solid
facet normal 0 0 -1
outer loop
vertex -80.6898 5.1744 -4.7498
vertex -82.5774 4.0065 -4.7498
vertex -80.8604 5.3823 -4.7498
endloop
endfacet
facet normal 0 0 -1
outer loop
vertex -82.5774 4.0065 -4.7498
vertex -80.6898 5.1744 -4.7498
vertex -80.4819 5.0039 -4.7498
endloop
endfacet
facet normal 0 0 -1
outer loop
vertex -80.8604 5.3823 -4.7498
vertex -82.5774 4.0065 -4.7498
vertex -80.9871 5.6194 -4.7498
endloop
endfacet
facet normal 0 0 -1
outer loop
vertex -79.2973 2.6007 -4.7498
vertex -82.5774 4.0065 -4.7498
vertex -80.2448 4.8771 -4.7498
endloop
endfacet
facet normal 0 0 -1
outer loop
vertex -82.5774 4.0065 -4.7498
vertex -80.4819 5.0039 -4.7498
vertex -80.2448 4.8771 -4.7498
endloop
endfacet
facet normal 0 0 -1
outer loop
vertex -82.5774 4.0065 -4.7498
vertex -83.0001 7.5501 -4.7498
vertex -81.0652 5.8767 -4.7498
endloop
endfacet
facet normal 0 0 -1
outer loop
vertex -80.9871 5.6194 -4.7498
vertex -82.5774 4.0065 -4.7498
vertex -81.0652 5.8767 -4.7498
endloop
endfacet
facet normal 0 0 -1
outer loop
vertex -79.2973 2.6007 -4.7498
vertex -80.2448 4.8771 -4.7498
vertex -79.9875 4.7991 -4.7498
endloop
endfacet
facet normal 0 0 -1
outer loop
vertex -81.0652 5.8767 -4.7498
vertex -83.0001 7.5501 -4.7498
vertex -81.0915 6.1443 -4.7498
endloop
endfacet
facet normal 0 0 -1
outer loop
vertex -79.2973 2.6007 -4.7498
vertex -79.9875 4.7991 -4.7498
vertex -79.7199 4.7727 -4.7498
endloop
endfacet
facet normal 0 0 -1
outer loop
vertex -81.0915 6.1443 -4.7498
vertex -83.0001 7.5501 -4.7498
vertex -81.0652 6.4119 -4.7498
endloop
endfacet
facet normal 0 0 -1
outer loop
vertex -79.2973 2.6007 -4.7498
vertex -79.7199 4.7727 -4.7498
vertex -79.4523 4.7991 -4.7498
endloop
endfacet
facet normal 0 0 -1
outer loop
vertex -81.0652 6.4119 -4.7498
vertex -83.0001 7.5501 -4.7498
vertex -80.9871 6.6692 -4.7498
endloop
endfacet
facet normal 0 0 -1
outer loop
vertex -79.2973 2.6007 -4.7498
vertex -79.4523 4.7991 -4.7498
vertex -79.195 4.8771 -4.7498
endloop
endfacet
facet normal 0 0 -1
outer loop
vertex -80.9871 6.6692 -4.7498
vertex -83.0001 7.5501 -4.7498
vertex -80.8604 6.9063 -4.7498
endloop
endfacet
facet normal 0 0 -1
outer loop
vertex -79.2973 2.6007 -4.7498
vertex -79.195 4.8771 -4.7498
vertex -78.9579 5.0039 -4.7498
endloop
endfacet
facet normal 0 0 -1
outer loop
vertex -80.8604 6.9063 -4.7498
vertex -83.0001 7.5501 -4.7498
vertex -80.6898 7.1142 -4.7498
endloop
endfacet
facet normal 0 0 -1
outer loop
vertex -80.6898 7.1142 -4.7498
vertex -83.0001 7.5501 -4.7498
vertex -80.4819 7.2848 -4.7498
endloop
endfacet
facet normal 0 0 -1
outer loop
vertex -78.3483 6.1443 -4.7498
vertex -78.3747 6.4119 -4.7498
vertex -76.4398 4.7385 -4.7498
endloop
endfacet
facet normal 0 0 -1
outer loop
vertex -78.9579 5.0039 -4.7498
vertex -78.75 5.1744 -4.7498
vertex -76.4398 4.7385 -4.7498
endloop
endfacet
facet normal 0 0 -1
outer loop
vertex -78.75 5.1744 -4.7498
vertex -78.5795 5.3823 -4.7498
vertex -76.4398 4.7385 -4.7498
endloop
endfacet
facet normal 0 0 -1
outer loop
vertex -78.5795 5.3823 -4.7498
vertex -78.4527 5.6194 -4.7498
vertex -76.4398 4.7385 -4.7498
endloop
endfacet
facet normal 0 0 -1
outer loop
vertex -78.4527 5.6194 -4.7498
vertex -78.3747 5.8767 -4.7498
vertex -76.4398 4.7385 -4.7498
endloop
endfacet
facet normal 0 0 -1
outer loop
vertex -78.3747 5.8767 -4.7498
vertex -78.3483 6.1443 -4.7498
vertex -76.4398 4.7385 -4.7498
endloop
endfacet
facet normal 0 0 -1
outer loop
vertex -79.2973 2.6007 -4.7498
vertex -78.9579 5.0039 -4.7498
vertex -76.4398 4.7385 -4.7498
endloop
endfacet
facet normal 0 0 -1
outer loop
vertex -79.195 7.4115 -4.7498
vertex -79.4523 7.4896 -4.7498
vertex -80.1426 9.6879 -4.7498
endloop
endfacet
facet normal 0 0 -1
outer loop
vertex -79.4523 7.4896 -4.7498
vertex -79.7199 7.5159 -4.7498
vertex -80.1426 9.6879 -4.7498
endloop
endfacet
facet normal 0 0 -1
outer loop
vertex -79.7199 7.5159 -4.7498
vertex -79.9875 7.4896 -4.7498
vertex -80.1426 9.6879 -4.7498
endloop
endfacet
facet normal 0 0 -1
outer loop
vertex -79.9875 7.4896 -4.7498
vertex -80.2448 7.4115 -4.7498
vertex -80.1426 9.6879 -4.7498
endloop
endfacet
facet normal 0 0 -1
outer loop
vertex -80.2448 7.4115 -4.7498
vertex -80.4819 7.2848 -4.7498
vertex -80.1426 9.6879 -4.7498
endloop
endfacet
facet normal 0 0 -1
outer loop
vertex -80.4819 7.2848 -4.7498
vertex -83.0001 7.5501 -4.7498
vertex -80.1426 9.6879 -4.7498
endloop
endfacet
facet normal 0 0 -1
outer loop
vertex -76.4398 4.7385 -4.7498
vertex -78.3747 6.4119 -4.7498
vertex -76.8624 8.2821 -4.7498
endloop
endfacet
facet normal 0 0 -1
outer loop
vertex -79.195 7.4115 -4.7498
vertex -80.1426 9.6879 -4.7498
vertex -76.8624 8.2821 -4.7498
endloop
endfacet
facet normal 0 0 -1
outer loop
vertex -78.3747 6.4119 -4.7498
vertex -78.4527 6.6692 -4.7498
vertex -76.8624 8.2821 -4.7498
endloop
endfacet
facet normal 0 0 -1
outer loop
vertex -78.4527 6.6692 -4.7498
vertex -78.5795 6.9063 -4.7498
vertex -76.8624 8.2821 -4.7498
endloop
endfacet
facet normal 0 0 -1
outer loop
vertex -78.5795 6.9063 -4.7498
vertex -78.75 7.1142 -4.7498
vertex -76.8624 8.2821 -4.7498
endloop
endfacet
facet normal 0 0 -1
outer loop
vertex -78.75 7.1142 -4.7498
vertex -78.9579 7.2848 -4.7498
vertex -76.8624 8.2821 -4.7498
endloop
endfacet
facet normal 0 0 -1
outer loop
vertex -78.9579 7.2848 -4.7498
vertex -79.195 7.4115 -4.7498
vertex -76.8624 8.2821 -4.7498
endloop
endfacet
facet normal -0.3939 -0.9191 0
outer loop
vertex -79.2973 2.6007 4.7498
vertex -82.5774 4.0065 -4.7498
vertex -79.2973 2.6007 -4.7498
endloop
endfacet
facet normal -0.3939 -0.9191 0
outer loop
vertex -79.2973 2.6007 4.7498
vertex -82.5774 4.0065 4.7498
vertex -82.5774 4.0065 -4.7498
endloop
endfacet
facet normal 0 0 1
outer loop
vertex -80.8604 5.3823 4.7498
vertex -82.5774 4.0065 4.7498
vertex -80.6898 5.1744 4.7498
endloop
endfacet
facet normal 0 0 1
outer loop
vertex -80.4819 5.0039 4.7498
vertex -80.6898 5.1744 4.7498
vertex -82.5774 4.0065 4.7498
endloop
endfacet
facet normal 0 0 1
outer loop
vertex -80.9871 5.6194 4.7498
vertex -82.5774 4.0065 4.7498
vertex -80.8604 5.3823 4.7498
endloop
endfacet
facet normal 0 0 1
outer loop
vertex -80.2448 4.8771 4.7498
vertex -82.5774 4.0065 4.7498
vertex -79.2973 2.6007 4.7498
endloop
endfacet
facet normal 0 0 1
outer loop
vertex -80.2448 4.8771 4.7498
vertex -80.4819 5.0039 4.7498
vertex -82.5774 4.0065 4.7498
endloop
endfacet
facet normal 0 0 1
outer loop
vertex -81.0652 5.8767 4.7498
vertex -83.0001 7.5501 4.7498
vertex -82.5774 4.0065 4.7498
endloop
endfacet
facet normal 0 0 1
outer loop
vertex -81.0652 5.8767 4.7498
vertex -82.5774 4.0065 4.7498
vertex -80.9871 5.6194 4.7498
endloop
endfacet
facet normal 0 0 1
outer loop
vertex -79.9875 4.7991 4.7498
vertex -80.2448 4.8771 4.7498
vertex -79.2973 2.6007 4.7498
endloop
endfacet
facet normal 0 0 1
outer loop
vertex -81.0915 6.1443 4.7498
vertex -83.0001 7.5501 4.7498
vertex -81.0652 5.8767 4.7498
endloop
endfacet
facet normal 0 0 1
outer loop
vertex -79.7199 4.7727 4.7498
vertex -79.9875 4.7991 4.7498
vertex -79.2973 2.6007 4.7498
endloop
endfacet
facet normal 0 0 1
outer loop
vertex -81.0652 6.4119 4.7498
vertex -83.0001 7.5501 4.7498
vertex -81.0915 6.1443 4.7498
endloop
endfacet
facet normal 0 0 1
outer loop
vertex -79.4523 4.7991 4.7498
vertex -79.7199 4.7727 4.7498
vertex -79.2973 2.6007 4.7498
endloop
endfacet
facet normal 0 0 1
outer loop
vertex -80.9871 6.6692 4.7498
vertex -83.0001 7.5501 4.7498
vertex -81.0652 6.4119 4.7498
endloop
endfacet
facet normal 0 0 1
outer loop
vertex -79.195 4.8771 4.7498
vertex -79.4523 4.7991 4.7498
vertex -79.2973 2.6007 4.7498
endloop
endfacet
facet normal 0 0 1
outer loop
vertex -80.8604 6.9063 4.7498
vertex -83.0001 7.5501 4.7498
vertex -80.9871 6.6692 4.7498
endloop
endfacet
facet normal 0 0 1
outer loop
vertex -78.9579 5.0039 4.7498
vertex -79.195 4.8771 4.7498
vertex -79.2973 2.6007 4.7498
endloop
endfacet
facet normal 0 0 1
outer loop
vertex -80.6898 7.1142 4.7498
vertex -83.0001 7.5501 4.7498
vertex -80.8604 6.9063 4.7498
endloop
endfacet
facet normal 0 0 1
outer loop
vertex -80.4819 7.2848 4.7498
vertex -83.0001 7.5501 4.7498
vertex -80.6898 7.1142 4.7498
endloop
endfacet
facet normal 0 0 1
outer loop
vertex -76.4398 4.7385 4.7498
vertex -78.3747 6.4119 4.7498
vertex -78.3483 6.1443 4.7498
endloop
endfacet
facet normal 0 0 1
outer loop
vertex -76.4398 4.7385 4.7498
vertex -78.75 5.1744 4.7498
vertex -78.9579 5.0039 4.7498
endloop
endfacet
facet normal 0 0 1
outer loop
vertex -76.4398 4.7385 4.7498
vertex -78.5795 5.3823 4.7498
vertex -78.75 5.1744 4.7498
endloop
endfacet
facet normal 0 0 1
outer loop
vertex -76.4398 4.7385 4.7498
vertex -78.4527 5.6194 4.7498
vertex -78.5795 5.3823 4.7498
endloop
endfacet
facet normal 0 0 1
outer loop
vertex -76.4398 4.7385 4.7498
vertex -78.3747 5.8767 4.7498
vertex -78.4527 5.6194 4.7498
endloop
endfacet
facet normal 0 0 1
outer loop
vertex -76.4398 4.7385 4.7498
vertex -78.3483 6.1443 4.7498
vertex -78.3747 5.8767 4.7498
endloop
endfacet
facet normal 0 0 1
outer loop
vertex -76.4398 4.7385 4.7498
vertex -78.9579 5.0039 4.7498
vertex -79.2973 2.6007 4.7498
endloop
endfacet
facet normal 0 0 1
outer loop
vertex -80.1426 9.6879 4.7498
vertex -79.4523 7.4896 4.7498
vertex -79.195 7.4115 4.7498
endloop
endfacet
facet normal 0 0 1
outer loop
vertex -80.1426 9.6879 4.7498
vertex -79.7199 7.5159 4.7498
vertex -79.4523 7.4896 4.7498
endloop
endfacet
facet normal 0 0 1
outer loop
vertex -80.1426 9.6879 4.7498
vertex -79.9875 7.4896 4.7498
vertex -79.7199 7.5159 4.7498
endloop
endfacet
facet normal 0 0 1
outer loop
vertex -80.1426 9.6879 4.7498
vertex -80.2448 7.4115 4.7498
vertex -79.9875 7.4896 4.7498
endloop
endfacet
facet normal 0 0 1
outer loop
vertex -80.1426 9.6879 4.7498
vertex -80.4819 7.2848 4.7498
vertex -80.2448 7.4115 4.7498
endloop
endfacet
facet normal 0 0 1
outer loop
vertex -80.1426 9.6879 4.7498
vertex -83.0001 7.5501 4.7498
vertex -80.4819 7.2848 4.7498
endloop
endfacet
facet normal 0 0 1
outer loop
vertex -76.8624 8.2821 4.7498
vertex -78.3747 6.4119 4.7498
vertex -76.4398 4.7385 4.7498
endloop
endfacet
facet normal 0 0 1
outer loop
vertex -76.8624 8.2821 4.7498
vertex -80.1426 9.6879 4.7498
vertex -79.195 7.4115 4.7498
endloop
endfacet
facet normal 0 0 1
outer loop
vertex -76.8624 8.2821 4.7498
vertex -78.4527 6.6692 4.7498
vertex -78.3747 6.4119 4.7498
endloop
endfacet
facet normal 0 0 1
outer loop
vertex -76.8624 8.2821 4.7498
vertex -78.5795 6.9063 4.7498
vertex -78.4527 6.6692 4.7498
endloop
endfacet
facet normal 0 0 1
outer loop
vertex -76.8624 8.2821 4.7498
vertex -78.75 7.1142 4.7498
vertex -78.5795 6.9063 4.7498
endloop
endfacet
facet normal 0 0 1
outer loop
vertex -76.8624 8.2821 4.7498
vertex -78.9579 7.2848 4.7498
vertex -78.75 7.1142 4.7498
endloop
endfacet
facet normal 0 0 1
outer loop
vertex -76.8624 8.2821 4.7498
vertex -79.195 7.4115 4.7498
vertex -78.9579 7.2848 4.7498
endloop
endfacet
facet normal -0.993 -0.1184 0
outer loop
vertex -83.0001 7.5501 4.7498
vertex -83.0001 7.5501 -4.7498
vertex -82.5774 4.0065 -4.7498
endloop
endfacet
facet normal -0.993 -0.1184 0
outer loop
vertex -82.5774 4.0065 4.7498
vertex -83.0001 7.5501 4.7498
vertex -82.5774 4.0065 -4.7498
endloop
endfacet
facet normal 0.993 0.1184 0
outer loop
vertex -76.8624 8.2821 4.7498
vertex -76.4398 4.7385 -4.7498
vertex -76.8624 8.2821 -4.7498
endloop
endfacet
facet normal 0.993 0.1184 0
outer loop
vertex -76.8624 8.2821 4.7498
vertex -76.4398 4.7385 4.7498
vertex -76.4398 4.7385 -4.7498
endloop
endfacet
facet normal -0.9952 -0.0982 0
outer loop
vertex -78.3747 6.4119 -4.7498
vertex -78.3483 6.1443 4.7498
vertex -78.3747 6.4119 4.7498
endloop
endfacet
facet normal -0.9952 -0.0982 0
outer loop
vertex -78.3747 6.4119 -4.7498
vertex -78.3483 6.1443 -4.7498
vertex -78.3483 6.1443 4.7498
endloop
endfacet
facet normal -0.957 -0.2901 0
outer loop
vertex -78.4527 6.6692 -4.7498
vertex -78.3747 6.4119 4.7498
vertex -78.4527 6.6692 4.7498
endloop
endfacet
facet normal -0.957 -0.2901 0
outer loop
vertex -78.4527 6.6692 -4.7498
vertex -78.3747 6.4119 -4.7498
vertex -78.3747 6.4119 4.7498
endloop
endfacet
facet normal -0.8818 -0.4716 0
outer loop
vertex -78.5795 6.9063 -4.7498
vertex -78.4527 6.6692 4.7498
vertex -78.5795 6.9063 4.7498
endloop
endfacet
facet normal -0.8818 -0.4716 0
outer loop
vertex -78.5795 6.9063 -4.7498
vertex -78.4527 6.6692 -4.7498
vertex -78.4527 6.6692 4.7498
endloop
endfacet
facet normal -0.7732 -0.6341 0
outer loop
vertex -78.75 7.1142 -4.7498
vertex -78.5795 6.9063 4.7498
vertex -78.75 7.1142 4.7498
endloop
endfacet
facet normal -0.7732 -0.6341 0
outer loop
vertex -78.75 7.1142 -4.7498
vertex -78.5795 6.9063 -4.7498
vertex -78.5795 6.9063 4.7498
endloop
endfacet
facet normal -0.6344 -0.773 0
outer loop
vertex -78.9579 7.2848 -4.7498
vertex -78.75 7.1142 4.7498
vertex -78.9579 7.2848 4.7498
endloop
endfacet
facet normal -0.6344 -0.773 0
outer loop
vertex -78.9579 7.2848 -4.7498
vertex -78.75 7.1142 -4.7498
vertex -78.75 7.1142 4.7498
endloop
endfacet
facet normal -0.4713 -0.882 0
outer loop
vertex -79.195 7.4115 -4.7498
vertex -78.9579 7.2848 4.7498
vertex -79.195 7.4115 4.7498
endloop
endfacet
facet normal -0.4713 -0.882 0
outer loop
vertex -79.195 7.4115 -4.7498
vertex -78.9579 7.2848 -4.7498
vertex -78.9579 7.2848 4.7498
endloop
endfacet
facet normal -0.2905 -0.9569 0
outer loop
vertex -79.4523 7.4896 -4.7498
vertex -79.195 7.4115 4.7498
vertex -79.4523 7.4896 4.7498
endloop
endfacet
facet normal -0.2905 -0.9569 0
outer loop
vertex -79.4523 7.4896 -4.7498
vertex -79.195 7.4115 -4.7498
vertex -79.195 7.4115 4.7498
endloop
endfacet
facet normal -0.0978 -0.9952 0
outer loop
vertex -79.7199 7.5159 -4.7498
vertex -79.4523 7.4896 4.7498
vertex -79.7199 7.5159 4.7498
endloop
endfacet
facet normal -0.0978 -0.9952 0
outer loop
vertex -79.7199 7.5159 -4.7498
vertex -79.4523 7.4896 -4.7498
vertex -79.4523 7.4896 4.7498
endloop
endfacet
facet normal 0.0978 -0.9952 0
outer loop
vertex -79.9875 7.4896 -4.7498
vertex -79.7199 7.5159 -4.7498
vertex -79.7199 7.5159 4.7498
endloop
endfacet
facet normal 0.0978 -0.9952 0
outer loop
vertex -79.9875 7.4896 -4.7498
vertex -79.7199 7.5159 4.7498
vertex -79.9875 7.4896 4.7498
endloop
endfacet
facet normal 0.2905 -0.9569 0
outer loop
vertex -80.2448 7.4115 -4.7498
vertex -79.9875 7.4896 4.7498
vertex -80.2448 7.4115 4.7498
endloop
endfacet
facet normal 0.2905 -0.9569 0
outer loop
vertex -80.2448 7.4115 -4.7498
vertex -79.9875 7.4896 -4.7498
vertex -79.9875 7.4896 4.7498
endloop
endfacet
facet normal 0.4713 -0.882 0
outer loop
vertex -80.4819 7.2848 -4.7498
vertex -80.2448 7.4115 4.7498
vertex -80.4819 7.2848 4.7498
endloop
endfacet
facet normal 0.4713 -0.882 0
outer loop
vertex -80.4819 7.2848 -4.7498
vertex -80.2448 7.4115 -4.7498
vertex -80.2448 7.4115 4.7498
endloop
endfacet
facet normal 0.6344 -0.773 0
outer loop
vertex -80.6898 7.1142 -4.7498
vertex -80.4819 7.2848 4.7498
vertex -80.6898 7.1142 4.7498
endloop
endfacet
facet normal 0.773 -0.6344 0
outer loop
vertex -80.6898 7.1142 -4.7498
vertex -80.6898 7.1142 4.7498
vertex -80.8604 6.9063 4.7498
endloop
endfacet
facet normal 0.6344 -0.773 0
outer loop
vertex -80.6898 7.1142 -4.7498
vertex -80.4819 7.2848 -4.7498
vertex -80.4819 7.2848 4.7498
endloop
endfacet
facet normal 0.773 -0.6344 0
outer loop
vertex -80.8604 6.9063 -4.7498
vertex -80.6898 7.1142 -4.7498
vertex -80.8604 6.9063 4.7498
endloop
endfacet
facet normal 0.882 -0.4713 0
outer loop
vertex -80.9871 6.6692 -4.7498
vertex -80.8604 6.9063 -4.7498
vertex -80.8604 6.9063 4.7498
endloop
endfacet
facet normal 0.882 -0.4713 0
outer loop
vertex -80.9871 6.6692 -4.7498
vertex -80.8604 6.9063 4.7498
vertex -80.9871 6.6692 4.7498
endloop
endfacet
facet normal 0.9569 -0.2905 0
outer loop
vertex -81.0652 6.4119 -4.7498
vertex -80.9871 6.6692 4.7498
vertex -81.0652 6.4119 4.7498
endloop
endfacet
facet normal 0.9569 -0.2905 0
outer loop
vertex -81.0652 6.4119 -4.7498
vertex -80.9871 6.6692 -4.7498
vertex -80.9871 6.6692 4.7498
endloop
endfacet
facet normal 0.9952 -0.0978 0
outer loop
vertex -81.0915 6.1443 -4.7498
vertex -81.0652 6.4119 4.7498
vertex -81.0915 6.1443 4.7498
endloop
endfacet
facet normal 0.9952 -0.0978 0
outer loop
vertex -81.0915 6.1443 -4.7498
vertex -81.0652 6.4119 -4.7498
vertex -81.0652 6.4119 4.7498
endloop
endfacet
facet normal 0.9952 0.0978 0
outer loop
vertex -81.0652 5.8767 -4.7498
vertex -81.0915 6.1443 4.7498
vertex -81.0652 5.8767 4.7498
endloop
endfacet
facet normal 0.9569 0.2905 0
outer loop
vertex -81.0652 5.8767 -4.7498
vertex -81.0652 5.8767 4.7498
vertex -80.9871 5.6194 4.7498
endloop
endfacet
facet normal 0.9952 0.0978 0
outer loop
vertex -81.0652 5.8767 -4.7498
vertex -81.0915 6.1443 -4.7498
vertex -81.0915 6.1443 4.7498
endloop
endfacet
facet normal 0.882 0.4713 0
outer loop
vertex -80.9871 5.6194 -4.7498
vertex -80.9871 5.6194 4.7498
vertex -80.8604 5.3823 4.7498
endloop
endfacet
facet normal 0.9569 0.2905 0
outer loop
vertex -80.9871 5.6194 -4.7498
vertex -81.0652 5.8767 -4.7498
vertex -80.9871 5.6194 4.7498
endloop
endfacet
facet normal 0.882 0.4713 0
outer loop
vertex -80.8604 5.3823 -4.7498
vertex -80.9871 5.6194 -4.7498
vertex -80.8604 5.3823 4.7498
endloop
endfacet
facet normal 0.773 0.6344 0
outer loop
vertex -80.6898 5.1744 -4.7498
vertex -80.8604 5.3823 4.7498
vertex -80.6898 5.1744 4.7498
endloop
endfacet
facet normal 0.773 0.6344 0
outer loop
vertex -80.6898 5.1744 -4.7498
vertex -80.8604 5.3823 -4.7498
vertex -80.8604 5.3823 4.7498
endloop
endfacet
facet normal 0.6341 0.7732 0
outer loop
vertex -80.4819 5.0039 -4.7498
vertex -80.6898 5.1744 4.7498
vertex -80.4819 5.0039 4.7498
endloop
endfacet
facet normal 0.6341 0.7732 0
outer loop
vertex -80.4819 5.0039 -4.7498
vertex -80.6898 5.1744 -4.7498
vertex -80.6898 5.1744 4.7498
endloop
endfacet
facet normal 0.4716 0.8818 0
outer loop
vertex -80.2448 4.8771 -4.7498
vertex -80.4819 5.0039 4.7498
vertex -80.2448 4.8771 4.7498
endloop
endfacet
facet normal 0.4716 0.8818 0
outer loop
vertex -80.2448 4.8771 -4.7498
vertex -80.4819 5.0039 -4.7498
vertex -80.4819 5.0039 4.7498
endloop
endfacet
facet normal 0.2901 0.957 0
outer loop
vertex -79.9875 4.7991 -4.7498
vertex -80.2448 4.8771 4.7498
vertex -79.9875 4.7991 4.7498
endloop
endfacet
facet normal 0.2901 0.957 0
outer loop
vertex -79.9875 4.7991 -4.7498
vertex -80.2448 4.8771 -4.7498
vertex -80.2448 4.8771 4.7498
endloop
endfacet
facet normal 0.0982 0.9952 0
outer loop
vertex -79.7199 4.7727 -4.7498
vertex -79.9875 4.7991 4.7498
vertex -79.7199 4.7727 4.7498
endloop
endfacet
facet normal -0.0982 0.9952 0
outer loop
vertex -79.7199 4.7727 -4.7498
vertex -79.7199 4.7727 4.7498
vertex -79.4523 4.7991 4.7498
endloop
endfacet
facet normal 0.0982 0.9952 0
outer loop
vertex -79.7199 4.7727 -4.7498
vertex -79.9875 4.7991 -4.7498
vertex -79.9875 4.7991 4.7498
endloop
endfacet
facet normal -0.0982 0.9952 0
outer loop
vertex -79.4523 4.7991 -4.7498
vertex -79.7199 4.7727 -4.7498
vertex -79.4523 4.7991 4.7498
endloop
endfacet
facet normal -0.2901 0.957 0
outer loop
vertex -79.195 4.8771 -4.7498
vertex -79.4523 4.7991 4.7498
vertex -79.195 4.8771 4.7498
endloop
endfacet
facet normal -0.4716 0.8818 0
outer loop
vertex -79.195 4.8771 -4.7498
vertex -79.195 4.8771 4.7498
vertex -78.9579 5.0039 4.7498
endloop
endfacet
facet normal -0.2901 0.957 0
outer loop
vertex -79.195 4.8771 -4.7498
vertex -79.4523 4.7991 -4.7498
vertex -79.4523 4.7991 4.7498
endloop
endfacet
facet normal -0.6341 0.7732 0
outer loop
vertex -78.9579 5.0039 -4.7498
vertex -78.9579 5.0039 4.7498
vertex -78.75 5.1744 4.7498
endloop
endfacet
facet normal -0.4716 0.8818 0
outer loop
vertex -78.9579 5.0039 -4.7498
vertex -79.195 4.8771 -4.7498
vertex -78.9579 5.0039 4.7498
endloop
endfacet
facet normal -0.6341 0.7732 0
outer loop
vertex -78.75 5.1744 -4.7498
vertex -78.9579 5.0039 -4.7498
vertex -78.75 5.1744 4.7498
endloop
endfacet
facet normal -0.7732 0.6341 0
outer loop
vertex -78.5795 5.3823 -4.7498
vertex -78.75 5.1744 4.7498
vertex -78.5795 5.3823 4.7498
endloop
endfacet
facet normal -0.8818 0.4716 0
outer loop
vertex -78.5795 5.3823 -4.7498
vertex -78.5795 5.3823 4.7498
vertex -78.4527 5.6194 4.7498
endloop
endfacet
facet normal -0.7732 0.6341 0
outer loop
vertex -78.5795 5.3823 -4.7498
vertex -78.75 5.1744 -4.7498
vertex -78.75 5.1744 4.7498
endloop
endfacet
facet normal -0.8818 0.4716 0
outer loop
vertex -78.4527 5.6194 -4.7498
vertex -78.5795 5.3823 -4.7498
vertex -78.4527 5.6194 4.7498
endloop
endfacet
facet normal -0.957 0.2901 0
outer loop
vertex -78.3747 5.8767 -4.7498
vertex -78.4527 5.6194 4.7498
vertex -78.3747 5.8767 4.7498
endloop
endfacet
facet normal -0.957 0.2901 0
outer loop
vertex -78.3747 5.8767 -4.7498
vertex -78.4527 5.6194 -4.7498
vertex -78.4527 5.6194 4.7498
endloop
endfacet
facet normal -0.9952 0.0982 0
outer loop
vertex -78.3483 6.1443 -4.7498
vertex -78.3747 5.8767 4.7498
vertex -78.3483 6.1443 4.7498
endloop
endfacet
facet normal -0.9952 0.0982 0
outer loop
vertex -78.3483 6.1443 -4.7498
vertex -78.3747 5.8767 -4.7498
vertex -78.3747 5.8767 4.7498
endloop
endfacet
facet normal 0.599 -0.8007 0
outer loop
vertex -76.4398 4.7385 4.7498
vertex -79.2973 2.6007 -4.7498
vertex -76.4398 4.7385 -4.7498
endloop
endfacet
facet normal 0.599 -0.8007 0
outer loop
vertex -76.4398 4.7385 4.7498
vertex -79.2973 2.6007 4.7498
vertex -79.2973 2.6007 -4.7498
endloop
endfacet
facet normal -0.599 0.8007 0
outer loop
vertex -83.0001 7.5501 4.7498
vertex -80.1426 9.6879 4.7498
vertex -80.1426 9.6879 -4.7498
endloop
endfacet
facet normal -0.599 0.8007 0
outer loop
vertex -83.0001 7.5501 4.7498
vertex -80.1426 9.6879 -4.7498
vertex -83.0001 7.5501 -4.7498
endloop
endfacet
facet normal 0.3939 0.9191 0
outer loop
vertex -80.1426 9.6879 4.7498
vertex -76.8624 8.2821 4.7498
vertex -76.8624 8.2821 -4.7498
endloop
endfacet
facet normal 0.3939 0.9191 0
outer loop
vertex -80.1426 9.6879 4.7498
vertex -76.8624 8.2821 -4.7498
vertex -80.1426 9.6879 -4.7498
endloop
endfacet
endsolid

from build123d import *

# Parameters (mm, degrees)
SKETCH7_R           = 1.3716
BOSS_EXTRUDE4_DEPTH = 4.7498


with BuildPart() as part:
    # Sketch7 → Boss-Extrude4 (new, symmetric)
    with BuildSketch(Plane.XY):
        Polygon((-76.439762625, 4.738534743), (-76.86239804, 8.282120356), (-80.142550908, 9.687900156), (-83.000068362, 7.550094344), (-82.577432948, 4.006508731), (-79.297280079, 2.600728931), align=None)
        with Locations((-79.719915494, 6.144314544)):
            Circle(SKETCH7_R, mode=Mode.SUBTRACT)
    extrude(amount=BOSS_EXTRUDE4_DEPTH, both=True)


solid = part.part
